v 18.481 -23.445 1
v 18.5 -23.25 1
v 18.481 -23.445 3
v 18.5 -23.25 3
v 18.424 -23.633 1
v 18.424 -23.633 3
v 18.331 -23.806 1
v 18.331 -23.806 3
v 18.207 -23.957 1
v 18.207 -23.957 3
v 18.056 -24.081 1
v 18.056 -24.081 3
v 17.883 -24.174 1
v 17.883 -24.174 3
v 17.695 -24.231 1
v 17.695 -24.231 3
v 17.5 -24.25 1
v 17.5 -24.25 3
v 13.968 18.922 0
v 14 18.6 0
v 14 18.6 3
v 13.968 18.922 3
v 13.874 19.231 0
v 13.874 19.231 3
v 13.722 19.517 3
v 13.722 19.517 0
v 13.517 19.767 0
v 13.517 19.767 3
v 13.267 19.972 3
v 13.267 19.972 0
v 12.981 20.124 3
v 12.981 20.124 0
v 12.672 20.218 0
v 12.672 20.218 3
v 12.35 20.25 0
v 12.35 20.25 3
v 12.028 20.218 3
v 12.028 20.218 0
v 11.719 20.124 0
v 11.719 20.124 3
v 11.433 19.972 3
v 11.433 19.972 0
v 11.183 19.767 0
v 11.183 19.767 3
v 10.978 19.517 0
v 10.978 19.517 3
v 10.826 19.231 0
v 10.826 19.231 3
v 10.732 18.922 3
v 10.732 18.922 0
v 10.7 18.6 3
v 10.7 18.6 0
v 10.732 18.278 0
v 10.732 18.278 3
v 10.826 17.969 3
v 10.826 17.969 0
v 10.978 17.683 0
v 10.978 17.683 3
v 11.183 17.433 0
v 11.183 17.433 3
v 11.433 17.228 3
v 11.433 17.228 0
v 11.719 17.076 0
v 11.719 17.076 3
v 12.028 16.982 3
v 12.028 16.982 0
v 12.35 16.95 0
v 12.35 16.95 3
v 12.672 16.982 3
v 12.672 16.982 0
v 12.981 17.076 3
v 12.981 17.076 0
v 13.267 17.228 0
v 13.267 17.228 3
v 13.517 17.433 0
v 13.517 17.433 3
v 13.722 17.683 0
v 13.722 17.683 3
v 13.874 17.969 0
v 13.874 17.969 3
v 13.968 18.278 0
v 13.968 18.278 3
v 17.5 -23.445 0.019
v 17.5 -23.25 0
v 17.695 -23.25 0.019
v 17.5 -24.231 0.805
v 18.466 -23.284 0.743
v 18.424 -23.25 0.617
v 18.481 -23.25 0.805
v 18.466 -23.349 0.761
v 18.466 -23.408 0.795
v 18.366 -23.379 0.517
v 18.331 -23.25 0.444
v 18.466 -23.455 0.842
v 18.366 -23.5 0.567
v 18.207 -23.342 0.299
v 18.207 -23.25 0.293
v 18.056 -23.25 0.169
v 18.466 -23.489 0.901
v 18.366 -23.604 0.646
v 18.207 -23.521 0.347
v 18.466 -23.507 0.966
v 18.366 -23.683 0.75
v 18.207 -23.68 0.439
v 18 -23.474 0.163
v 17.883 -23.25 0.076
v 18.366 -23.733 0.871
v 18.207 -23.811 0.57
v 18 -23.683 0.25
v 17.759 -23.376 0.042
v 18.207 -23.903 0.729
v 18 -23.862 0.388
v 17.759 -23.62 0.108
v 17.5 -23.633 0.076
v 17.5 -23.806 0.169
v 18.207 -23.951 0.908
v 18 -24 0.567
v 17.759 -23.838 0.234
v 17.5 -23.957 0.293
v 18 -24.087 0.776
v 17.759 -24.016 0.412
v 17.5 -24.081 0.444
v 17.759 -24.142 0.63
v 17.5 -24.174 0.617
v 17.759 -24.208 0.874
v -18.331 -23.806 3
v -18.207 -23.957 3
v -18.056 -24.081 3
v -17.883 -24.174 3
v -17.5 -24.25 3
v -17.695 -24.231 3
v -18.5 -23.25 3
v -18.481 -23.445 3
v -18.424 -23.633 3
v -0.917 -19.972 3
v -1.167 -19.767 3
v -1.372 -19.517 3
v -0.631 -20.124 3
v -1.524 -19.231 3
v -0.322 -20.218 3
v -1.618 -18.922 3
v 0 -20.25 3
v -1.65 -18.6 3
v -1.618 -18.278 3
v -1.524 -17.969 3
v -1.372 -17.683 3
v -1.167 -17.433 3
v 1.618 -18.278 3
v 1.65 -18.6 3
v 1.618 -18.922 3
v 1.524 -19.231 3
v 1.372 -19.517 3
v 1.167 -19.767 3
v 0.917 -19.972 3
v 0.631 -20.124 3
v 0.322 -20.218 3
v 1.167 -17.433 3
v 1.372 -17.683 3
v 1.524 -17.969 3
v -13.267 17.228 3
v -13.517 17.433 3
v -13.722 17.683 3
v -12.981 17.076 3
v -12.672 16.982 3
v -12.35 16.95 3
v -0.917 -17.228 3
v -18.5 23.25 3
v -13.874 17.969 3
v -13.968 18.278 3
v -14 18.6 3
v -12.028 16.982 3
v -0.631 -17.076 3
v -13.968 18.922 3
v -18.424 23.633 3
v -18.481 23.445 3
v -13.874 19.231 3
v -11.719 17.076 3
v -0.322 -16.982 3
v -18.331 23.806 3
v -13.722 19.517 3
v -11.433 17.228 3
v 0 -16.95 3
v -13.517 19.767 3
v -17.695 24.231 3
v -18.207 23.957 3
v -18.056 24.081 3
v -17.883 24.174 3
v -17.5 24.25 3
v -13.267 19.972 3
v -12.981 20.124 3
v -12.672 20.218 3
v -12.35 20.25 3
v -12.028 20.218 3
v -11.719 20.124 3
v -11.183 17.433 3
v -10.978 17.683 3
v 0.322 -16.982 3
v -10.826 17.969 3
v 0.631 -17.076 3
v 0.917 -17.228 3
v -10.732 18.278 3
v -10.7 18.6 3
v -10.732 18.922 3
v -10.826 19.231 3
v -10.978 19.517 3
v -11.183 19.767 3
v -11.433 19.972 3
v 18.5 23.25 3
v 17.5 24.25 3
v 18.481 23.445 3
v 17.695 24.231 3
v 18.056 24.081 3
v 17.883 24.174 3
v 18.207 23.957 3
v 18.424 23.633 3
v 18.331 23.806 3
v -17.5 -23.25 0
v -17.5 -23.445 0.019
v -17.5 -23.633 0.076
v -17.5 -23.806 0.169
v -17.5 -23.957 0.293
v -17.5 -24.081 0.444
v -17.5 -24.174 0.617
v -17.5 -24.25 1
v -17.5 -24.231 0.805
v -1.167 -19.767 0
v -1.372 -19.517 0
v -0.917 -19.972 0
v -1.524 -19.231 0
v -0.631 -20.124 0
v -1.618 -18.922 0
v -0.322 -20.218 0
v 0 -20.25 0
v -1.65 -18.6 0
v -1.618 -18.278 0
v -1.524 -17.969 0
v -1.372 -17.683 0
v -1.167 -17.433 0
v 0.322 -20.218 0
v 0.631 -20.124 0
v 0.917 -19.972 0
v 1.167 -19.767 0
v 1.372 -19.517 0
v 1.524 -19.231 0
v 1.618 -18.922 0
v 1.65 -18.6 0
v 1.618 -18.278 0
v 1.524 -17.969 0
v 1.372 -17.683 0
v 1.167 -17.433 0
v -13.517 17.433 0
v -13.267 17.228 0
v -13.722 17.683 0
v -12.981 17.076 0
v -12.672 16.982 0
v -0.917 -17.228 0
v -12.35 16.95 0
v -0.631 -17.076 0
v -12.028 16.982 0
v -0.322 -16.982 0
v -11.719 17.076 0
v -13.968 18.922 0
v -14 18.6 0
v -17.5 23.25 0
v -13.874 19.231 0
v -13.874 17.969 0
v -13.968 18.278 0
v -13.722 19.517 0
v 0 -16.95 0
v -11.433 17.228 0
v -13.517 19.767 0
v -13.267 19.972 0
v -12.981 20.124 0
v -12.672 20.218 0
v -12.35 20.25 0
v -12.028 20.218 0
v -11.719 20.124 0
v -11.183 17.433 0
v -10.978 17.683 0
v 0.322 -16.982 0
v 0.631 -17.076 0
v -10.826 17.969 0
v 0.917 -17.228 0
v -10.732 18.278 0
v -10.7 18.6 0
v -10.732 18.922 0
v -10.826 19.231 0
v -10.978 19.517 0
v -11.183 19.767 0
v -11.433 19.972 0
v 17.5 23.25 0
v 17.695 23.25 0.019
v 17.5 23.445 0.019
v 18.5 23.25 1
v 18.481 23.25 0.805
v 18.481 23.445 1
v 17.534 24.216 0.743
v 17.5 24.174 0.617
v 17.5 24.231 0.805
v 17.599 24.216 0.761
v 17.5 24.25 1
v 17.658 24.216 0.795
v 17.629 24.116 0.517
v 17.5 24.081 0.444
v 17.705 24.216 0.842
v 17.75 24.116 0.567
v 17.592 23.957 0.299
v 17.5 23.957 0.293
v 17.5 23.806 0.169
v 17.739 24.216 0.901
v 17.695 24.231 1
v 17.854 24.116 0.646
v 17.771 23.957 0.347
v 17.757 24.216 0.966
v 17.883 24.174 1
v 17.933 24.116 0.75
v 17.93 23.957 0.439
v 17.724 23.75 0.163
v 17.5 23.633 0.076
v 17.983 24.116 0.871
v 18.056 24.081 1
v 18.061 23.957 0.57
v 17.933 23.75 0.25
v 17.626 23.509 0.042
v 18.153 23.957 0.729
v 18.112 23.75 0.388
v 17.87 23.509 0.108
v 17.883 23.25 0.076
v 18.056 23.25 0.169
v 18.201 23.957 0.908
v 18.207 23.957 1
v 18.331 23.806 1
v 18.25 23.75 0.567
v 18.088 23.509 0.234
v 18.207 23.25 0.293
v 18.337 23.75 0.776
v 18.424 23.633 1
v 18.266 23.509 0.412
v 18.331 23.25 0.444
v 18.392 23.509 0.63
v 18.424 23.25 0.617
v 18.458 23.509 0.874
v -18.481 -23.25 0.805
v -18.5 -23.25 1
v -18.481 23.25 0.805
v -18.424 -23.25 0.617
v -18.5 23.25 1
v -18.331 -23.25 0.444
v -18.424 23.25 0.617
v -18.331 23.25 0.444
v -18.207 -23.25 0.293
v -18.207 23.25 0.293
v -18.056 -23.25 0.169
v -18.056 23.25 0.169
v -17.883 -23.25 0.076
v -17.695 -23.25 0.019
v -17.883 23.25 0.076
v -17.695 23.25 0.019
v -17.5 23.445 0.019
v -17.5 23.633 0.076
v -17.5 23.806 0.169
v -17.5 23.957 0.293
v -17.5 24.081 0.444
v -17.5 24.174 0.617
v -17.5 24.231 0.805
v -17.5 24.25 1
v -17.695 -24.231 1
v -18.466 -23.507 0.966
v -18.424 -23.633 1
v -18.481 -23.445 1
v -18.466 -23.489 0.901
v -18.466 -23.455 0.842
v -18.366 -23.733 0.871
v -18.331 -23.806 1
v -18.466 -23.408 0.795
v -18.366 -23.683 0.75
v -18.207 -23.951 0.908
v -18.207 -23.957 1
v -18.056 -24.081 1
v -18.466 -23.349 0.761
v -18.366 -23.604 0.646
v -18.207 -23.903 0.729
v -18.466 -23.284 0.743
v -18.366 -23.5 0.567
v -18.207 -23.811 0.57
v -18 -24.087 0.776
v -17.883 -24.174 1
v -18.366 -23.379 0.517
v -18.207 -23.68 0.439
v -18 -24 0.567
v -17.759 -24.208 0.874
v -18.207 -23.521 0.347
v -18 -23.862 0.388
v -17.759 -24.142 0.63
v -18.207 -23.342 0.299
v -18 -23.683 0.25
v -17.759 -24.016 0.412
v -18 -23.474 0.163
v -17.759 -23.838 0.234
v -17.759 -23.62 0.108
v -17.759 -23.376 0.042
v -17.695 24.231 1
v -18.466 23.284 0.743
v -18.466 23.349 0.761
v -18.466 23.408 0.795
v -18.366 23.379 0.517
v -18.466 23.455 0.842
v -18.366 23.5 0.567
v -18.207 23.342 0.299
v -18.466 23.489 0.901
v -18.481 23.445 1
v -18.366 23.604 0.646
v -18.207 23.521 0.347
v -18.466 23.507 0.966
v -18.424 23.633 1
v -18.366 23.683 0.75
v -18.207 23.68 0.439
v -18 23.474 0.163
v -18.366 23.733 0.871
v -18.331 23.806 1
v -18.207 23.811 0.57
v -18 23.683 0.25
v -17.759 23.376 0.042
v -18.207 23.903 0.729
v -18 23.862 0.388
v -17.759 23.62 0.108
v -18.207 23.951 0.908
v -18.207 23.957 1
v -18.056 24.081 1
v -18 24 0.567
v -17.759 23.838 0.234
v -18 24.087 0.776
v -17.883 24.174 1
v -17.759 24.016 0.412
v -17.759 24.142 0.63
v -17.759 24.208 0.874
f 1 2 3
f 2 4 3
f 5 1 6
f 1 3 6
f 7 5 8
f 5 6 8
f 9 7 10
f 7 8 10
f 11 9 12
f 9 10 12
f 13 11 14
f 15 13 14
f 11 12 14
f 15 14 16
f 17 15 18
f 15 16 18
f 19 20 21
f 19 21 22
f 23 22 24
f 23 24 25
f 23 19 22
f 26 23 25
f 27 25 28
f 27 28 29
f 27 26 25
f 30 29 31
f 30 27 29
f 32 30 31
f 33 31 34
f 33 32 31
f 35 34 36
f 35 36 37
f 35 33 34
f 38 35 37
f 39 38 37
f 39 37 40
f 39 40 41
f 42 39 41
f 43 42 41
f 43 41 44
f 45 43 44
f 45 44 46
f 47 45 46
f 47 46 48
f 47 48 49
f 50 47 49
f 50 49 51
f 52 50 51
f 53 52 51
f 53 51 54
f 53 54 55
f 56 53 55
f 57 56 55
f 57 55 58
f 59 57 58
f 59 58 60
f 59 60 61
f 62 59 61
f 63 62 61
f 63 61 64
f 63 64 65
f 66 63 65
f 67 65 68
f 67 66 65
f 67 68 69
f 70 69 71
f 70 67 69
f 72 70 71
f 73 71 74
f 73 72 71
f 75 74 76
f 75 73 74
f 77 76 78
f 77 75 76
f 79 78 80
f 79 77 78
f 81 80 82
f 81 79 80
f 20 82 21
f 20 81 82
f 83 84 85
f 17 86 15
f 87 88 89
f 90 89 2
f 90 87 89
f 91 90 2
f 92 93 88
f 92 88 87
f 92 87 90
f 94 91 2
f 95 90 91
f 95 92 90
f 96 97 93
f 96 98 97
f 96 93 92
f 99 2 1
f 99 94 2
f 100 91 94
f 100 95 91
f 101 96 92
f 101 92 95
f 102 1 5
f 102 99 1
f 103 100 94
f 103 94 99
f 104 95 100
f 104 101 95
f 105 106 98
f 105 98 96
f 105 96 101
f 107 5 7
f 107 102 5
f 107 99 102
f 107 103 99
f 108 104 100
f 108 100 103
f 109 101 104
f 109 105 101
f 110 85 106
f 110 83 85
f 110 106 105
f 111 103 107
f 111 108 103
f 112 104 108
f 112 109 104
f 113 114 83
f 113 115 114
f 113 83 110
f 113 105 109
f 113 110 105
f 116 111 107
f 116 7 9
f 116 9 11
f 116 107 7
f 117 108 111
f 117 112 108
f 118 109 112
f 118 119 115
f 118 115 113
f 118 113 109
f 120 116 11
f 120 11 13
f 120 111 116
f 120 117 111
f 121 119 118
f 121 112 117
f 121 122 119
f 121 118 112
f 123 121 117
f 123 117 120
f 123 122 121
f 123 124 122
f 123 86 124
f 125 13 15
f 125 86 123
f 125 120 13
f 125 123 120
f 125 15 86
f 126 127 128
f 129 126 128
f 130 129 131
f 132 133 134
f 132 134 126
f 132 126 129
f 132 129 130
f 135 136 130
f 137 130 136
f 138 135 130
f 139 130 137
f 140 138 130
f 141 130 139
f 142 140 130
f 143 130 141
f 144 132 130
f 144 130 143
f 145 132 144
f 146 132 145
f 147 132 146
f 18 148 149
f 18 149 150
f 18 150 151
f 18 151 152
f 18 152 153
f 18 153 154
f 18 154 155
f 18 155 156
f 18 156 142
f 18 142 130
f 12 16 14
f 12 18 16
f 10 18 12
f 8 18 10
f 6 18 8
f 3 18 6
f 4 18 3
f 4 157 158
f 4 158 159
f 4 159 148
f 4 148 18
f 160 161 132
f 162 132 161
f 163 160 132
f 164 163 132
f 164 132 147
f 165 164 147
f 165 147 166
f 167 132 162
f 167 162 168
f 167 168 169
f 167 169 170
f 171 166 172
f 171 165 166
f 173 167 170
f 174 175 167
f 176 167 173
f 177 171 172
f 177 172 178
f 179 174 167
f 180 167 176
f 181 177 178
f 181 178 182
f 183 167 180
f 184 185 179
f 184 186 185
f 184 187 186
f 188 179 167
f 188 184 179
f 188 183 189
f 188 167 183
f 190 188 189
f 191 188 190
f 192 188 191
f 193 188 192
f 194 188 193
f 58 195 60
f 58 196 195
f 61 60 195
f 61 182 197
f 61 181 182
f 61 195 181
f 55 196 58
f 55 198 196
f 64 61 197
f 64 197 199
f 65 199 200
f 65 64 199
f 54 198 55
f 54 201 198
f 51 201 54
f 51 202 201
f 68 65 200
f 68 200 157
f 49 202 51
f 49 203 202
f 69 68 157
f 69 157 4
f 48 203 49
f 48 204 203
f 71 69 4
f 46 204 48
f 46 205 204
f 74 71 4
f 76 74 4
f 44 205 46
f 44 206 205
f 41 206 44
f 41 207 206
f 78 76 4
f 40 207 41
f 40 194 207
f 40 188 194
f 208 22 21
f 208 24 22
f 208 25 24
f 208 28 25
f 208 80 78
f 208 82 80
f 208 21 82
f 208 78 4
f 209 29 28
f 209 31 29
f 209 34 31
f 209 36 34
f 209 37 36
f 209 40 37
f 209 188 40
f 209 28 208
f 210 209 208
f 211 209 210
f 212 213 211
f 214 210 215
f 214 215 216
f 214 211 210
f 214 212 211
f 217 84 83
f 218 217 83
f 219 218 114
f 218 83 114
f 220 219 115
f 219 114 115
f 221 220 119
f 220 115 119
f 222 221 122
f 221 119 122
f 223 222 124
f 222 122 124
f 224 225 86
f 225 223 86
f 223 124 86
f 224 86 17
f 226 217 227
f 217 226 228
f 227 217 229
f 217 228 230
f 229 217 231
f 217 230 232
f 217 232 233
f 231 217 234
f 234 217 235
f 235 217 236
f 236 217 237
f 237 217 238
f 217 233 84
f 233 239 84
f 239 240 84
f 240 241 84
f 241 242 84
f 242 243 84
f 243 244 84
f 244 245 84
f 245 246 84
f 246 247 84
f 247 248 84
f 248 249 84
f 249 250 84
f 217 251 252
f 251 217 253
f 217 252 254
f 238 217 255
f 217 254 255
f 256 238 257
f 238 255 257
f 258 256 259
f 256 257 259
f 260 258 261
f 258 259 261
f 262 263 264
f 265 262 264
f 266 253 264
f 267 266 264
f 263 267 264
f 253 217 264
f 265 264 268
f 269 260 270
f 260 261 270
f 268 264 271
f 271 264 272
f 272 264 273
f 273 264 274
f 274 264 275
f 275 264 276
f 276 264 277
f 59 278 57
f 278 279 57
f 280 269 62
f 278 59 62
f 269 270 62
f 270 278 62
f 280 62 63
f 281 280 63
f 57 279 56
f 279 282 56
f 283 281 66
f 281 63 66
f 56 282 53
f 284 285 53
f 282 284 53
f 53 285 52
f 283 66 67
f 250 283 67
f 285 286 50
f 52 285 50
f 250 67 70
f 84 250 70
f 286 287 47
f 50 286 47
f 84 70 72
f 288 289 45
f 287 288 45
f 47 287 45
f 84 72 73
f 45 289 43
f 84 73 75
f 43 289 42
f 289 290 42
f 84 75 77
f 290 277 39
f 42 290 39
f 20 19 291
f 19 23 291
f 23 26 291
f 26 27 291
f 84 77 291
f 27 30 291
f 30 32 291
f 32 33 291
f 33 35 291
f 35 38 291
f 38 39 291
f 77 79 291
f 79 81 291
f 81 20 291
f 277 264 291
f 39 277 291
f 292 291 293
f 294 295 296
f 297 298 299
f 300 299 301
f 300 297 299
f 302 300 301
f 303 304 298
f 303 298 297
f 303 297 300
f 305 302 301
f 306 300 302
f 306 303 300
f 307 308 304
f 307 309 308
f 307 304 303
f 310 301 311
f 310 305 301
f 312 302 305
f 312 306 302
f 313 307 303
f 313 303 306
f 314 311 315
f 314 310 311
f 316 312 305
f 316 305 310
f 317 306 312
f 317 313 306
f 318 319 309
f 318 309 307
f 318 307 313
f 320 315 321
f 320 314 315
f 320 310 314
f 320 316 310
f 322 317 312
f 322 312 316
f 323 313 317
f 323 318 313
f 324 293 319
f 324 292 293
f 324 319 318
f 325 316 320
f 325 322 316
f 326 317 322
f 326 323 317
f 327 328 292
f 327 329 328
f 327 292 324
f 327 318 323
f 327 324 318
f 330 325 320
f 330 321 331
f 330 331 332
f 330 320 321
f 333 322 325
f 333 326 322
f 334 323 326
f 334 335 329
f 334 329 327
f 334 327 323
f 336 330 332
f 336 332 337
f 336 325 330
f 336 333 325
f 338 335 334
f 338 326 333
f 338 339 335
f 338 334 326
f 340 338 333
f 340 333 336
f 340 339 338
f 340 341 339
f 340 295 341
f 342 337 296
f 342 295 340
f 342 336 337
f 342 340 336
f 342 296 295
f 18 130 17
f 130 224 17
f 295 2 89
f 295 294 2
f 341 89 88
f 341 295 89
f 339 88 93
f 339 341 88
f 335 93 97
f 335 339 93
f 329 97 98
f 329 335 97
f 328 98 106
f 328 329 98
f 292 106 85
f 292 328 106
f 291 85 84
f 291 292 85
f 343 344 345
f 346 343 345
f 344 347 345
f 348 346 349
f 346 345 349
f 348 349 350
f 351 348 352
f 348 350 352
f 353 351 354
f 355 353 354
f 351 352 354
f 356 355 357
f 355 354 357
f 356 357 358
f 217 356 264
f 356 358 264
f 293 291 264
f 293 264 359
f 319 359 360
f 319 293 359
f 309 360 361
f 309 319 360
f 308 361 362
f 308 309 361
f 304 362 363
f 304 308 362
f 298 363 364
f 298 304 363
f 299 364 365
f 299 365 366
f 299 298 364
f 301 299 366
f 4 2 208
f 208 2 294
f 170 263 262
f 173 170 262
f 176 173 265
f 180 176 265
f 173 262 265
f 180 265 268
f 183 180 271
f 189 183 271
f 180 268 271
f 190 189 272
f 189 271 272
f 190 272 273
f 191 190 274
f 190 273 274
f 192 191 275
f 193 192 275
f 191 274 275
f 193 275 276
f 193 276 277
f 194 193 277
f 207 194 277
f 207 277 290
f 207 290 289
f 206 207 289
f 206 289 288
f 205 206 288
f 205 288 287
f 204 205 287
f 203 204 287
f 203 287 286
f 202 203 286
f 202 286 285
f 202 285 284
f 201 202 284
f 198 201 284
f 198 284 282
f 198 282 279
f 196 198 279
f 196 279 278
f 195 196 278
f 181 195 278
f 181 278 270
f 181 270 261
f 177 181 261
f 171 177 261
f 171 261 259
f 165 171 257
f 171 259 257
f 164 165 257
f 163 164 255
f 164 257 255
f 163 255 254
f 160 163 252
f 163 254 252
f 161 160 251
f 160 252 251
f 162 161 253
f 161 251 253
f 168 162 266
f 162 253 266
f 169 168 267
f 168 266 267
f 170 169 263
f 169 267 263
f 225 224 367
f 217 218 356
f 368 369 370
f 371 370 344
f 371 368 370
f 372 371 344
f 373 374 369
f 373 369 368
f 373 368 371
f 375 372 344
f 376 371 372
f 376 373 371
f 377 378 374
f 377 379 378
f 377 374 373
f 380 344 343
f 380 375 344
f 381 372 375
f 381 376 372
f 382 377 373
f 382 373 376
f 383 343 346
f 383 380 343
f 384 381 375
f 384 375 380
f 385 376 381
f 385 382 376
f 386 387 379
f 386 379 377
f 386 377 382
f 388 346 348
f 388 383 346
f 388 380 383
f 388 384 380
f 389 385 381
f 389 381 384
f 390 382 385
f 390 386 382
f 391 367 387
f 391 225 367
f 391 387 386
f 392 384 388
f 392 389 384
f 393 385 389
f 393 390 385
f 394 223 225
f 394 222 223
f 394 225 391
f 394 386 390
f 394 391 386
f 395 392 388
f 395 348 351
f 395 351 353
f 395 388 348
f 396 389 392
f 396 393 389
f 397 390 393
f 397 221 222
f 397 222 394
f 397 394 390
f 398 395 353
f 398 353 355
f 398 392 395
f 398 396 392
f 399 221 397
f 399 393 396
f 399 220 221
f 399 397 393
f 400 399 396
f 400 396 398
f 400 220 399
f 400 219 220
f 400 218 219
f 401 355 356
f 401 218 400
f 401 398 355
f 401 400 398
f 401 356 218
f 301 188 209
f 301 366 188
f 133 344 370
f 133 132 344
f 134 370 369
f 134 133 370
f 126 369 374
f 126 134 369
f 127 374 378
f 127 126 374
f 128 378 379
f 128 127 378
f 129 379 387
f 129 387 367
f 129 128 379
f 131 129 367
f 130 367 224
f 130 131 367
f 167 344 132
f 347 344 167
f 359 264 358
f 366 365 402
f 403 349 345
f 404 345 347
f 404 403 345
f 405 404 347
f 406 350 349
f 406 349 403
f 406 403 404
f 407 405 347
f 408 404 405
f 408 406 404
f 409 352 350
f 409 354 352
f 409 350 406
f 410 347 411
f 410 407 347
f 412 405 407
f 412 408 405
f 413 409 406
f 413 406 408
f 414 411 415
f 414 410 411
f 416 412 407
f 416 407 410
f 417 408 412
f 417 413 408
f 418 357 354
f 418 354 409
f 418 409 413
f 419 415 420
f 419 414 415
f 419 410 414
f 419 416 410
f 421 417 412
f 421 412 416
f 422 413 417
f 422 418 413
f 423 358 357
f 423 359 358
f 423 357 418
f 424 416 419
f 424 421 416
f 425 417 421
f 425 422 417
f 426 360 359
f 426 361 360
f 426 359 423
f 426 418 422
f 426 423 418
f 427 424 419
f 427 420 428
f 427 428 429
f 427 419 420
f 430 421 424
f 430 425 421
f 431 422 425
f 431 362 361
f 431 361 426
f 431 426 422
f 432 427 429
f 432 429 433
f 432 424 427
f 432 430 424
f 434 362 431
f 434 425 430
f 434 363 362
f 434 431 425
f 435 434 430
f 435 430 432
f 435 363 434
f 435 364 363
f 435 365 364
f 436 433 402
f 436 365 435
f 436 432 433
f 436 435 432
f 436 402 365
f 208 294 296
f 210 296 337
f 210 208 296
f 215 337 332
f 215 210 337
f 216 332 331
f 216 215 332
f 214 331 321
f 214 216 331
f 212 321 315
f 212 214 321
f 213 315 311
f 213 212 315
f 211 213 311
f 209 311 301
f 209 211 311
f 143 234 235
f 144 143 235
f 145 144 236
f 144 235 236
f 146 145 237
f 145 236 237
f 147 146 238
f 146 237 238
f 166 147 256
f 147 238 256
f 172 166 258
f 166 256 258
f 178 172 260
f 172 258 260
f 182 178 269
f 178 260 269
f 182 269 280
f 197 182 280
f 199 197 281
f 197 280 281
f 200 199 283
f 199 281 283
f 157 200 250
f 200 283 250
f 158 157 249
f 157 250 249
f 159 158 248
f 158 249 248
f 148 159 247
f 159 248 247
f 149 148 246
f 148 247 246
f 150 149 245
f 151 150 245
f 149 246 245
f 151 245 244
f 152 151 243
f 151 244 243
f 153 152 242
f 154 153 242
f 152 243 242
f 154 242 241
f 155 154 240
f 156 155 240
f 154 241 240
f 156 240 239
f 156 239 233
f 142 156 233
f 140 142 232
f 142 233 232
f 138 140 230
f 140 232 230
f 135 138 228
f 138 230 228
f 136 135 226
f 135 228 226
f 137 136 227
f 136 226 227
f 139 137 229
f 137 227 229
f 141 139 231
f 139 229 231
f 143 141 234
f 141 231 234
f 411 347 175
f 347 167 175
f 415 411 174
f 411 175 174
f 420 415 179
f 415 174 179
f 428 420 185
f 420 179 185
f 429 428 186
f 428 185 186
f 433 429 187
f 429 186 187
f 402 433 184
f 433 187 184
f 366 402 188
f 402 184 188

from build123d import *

# Parameters (mm, degrees)
SKETCH1_W           = 31
SKETCH1_H           = 42.5
BOSS_EXTRUDE1_DEPTH = 3
SKETCH2_W           = 37
SKETCH2_H           = 48.5
SKETCH2_W_2         = 31
SKETCH2_H_2         = 42.5
BOSS_EXTRUDE2_DEPTH = 3
CUT_EXTRUDE1_REACH  = 32.648
SKETCH3_R           = 1.65
FILLET4_R           = 1


with BuildPart() as part:
    # Sketch1 → Boss-Extrude1 (new body)
    with BuildSketch(Plane.XY):
        Rectangle(SKETCH1_W, SKETCH1_H)
    extrude(amount=BOSS_EXTRUDE1_DEPTH)

    # Sketch2 → Boss-Extrude2 (add)
    with BuildSketch(Plane.XY):
        Rectangle(SKETCH2_W, SKETCH2_H)
        Rectangle(SKETCH2_W_2, SKETCH2_H_2, mode=Mode.SUBTRACT)
    extrude(amount=BOSS_EXTRUDE2_DEPTH)

    # Sketch3 → Cut-Extrude1 (cut, up to next)
    with BuildSketch(Plane(origin=(0, 0, 0), x_dir=(-1, 0, 0), z_dir=(0, 0, -1)), mode=Mode.PRIVATE) as cut_extrude1_sk1:
        with Locations((12.35, 18.6)):
            Circle(SKETCH3_R)
    cut_extrude1_tool1 = extrude(cut_extrude1_sk1.sketch, amount=-CUT_EXTRUDE1_REACH, mode=Mode.PRIVATE) & part.part
    # Sketch3 → Cut-Extrude1 (cut, up to next)
    with BuildSketch(Plane(origin=(0, 0, 0), x_dir=(-1, 0, 0), z_dir=(0, 0, -1)), mode=Mode.PRIVATE) as cut_extrude1_sk2:
        with Locations((0, -18.6)):
            Circle(SKETCH3_R)
    cut_extrude1_tool2 = extrude(cut_extrude1_sk2.sketch, amount=-CUT_EXTRUDE1_REACH, mode=Mode.PRIVATE) & part.part
    cut_extrude1_1 = cut_extrude1_tool1.solids().sort_by_distance((-12.35, 18.6, 0))[0]
    add(cut_extrude1_1, mode=Mode.SUBTRACT)
    cut_extrude1_2 = cut_extrude1_tool2.solids().sort_by_distance((0, -18.6, 0))[0]
    add(cut_extrude1_2, mode=Mode.SUBTRACT)
    cut_extrude1 = cut_extrude1_1 + cut_extrude1_2  # Cut-Extrude1 as one shape, for the pattern or mirror that repeats it

    # Mirror1: Cut-Extrude1 across plane
    add(cut_extrude1.mirror(Plane(origin=(0, 0, 0), x_dir=(0, 0, 1), z_dir=(1, 0, 0))), mode=Mode.SUBTRACT)

    # Fillet4
    fillet4_edges = [part.edges().sort_by_distance(p)[0] for p in [
        (0, -24.25, 0),
        (-18.5, -24.25, 1.5),
        (18.5, 0, 0),
        (18.5, -24.25, 1.5),
        (0, 24.25, 0),
        (18.5, 24.25, 1.5),
        (-18.5, 0, 0),
        (-18.5, 24.25, 1.5),
    ]]
    fillet(fillet4_edges, radius=FILLET4_R)


solid = part.part
